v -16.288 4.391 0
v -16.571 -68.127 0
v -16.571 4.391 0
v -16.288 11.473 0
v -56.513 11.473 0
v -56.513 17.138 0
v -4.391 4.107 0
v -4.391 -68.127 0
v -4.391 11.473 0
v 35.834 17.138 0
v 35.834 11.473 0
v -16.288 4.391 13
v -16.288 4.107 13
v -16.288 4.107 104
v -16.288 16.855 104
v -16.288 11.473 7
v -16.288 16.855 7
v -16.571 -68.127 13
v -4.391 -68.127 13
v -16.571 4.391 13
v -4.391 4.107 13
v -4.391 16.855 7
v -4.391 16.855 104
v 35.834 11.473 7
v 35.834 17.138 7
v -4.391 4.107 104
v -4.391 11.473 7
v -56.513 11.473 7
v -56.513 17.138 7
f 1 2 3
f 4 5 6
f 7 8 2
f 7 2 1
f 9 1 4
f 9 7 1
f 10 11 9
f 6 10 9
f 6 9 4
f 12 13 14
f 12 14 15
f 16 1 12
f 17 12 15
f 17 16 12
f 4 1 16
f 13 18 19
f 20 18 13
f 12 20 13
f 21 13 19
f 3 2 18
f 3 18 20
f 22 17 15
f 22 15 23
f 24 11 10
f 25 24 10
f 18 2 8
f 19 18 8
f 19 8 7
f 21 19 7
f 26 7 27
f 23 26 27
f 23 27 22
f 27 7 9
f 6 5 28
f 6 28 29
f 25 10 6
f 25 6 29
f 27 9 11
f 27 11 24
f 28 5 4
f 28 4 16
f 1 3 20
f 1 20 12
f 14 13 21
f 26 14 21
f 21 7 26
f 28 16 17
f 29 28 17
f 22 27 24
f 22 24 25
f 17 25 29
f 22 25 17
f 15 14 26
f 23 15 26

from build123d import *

# Parameters (mm, degrees)
F0_W     = 11.8974833749
F0_H     = 12.7473026514
F1_DEPTH = 104
F2_W     = 12.1807525866
F2_H     = 72.517989669
F3_DEPTH = 13
F4_W     = 40
F4_H     = 5.6654671207
F5_DEPTH = 7
F6_DEPTH = 12.1
F7_DEPTH = 3


with BuildPart() as f1:
    # F0 (on Top) → F1 (new body)
    with BuildSketch(Plane.XY):
        with Locations((-10.339479195, 10.4811154306)):
            Rectangle(F0_W, F0_H)
    extrude(amount=F1_DEPTH)

    # F2 (on Top) → F3 (join)
    with BuildSketch(Plane.XY):
        with Locations((-10.4811156634, -31.868257327)):
            Rectangle(F2_W, F2_H)
    extrude(amount=F3_DEPTH)



with BuildPart() as f5:
    # F4 (on Top) → F5 (new body)
    with BuildSketch(Plane.XY):
        with Locations((15.8340851963, 14.3053061329)):
            Rectangle(F4_W, F4_H)
    extrude(amount=F5_DEPTH)


with BuildPart() as f5b:
    # F4 (on Top) → F5, piece 2 (new body)
    with BuildSketch(Plane.XY):
        with Locations((-36.5130412579, 14.3053061329)):
            Rectangle(F4_W, F4_H)
    extrude(amount=F5_DEPTH)


with BuildPart() as f1_1:
    add(f1.part)
    # F6 (add): a face of the model
    f6_faces = [f5b.part.faces().sort_by_distance(p)[0] for p in [
        (-16.5130412579, 14.3053061329, 3.5),
    ]]

    add(f5b.part)  # F6 merges F5b
    extrude(f6_faces, amount=F6_DEPTH)

    # F7 (add): a face of the model
    f7_faces = [f5.part.faces().sort_by_distance(p)[0] for p in [
        (-4.1659148037, 14.3053061329, 3.5),
    ]]

    add(f5.part)  # F7 merges F5
    extrude(f7_faces, amount=F7_DEPTH)


solid = f1_1.part
